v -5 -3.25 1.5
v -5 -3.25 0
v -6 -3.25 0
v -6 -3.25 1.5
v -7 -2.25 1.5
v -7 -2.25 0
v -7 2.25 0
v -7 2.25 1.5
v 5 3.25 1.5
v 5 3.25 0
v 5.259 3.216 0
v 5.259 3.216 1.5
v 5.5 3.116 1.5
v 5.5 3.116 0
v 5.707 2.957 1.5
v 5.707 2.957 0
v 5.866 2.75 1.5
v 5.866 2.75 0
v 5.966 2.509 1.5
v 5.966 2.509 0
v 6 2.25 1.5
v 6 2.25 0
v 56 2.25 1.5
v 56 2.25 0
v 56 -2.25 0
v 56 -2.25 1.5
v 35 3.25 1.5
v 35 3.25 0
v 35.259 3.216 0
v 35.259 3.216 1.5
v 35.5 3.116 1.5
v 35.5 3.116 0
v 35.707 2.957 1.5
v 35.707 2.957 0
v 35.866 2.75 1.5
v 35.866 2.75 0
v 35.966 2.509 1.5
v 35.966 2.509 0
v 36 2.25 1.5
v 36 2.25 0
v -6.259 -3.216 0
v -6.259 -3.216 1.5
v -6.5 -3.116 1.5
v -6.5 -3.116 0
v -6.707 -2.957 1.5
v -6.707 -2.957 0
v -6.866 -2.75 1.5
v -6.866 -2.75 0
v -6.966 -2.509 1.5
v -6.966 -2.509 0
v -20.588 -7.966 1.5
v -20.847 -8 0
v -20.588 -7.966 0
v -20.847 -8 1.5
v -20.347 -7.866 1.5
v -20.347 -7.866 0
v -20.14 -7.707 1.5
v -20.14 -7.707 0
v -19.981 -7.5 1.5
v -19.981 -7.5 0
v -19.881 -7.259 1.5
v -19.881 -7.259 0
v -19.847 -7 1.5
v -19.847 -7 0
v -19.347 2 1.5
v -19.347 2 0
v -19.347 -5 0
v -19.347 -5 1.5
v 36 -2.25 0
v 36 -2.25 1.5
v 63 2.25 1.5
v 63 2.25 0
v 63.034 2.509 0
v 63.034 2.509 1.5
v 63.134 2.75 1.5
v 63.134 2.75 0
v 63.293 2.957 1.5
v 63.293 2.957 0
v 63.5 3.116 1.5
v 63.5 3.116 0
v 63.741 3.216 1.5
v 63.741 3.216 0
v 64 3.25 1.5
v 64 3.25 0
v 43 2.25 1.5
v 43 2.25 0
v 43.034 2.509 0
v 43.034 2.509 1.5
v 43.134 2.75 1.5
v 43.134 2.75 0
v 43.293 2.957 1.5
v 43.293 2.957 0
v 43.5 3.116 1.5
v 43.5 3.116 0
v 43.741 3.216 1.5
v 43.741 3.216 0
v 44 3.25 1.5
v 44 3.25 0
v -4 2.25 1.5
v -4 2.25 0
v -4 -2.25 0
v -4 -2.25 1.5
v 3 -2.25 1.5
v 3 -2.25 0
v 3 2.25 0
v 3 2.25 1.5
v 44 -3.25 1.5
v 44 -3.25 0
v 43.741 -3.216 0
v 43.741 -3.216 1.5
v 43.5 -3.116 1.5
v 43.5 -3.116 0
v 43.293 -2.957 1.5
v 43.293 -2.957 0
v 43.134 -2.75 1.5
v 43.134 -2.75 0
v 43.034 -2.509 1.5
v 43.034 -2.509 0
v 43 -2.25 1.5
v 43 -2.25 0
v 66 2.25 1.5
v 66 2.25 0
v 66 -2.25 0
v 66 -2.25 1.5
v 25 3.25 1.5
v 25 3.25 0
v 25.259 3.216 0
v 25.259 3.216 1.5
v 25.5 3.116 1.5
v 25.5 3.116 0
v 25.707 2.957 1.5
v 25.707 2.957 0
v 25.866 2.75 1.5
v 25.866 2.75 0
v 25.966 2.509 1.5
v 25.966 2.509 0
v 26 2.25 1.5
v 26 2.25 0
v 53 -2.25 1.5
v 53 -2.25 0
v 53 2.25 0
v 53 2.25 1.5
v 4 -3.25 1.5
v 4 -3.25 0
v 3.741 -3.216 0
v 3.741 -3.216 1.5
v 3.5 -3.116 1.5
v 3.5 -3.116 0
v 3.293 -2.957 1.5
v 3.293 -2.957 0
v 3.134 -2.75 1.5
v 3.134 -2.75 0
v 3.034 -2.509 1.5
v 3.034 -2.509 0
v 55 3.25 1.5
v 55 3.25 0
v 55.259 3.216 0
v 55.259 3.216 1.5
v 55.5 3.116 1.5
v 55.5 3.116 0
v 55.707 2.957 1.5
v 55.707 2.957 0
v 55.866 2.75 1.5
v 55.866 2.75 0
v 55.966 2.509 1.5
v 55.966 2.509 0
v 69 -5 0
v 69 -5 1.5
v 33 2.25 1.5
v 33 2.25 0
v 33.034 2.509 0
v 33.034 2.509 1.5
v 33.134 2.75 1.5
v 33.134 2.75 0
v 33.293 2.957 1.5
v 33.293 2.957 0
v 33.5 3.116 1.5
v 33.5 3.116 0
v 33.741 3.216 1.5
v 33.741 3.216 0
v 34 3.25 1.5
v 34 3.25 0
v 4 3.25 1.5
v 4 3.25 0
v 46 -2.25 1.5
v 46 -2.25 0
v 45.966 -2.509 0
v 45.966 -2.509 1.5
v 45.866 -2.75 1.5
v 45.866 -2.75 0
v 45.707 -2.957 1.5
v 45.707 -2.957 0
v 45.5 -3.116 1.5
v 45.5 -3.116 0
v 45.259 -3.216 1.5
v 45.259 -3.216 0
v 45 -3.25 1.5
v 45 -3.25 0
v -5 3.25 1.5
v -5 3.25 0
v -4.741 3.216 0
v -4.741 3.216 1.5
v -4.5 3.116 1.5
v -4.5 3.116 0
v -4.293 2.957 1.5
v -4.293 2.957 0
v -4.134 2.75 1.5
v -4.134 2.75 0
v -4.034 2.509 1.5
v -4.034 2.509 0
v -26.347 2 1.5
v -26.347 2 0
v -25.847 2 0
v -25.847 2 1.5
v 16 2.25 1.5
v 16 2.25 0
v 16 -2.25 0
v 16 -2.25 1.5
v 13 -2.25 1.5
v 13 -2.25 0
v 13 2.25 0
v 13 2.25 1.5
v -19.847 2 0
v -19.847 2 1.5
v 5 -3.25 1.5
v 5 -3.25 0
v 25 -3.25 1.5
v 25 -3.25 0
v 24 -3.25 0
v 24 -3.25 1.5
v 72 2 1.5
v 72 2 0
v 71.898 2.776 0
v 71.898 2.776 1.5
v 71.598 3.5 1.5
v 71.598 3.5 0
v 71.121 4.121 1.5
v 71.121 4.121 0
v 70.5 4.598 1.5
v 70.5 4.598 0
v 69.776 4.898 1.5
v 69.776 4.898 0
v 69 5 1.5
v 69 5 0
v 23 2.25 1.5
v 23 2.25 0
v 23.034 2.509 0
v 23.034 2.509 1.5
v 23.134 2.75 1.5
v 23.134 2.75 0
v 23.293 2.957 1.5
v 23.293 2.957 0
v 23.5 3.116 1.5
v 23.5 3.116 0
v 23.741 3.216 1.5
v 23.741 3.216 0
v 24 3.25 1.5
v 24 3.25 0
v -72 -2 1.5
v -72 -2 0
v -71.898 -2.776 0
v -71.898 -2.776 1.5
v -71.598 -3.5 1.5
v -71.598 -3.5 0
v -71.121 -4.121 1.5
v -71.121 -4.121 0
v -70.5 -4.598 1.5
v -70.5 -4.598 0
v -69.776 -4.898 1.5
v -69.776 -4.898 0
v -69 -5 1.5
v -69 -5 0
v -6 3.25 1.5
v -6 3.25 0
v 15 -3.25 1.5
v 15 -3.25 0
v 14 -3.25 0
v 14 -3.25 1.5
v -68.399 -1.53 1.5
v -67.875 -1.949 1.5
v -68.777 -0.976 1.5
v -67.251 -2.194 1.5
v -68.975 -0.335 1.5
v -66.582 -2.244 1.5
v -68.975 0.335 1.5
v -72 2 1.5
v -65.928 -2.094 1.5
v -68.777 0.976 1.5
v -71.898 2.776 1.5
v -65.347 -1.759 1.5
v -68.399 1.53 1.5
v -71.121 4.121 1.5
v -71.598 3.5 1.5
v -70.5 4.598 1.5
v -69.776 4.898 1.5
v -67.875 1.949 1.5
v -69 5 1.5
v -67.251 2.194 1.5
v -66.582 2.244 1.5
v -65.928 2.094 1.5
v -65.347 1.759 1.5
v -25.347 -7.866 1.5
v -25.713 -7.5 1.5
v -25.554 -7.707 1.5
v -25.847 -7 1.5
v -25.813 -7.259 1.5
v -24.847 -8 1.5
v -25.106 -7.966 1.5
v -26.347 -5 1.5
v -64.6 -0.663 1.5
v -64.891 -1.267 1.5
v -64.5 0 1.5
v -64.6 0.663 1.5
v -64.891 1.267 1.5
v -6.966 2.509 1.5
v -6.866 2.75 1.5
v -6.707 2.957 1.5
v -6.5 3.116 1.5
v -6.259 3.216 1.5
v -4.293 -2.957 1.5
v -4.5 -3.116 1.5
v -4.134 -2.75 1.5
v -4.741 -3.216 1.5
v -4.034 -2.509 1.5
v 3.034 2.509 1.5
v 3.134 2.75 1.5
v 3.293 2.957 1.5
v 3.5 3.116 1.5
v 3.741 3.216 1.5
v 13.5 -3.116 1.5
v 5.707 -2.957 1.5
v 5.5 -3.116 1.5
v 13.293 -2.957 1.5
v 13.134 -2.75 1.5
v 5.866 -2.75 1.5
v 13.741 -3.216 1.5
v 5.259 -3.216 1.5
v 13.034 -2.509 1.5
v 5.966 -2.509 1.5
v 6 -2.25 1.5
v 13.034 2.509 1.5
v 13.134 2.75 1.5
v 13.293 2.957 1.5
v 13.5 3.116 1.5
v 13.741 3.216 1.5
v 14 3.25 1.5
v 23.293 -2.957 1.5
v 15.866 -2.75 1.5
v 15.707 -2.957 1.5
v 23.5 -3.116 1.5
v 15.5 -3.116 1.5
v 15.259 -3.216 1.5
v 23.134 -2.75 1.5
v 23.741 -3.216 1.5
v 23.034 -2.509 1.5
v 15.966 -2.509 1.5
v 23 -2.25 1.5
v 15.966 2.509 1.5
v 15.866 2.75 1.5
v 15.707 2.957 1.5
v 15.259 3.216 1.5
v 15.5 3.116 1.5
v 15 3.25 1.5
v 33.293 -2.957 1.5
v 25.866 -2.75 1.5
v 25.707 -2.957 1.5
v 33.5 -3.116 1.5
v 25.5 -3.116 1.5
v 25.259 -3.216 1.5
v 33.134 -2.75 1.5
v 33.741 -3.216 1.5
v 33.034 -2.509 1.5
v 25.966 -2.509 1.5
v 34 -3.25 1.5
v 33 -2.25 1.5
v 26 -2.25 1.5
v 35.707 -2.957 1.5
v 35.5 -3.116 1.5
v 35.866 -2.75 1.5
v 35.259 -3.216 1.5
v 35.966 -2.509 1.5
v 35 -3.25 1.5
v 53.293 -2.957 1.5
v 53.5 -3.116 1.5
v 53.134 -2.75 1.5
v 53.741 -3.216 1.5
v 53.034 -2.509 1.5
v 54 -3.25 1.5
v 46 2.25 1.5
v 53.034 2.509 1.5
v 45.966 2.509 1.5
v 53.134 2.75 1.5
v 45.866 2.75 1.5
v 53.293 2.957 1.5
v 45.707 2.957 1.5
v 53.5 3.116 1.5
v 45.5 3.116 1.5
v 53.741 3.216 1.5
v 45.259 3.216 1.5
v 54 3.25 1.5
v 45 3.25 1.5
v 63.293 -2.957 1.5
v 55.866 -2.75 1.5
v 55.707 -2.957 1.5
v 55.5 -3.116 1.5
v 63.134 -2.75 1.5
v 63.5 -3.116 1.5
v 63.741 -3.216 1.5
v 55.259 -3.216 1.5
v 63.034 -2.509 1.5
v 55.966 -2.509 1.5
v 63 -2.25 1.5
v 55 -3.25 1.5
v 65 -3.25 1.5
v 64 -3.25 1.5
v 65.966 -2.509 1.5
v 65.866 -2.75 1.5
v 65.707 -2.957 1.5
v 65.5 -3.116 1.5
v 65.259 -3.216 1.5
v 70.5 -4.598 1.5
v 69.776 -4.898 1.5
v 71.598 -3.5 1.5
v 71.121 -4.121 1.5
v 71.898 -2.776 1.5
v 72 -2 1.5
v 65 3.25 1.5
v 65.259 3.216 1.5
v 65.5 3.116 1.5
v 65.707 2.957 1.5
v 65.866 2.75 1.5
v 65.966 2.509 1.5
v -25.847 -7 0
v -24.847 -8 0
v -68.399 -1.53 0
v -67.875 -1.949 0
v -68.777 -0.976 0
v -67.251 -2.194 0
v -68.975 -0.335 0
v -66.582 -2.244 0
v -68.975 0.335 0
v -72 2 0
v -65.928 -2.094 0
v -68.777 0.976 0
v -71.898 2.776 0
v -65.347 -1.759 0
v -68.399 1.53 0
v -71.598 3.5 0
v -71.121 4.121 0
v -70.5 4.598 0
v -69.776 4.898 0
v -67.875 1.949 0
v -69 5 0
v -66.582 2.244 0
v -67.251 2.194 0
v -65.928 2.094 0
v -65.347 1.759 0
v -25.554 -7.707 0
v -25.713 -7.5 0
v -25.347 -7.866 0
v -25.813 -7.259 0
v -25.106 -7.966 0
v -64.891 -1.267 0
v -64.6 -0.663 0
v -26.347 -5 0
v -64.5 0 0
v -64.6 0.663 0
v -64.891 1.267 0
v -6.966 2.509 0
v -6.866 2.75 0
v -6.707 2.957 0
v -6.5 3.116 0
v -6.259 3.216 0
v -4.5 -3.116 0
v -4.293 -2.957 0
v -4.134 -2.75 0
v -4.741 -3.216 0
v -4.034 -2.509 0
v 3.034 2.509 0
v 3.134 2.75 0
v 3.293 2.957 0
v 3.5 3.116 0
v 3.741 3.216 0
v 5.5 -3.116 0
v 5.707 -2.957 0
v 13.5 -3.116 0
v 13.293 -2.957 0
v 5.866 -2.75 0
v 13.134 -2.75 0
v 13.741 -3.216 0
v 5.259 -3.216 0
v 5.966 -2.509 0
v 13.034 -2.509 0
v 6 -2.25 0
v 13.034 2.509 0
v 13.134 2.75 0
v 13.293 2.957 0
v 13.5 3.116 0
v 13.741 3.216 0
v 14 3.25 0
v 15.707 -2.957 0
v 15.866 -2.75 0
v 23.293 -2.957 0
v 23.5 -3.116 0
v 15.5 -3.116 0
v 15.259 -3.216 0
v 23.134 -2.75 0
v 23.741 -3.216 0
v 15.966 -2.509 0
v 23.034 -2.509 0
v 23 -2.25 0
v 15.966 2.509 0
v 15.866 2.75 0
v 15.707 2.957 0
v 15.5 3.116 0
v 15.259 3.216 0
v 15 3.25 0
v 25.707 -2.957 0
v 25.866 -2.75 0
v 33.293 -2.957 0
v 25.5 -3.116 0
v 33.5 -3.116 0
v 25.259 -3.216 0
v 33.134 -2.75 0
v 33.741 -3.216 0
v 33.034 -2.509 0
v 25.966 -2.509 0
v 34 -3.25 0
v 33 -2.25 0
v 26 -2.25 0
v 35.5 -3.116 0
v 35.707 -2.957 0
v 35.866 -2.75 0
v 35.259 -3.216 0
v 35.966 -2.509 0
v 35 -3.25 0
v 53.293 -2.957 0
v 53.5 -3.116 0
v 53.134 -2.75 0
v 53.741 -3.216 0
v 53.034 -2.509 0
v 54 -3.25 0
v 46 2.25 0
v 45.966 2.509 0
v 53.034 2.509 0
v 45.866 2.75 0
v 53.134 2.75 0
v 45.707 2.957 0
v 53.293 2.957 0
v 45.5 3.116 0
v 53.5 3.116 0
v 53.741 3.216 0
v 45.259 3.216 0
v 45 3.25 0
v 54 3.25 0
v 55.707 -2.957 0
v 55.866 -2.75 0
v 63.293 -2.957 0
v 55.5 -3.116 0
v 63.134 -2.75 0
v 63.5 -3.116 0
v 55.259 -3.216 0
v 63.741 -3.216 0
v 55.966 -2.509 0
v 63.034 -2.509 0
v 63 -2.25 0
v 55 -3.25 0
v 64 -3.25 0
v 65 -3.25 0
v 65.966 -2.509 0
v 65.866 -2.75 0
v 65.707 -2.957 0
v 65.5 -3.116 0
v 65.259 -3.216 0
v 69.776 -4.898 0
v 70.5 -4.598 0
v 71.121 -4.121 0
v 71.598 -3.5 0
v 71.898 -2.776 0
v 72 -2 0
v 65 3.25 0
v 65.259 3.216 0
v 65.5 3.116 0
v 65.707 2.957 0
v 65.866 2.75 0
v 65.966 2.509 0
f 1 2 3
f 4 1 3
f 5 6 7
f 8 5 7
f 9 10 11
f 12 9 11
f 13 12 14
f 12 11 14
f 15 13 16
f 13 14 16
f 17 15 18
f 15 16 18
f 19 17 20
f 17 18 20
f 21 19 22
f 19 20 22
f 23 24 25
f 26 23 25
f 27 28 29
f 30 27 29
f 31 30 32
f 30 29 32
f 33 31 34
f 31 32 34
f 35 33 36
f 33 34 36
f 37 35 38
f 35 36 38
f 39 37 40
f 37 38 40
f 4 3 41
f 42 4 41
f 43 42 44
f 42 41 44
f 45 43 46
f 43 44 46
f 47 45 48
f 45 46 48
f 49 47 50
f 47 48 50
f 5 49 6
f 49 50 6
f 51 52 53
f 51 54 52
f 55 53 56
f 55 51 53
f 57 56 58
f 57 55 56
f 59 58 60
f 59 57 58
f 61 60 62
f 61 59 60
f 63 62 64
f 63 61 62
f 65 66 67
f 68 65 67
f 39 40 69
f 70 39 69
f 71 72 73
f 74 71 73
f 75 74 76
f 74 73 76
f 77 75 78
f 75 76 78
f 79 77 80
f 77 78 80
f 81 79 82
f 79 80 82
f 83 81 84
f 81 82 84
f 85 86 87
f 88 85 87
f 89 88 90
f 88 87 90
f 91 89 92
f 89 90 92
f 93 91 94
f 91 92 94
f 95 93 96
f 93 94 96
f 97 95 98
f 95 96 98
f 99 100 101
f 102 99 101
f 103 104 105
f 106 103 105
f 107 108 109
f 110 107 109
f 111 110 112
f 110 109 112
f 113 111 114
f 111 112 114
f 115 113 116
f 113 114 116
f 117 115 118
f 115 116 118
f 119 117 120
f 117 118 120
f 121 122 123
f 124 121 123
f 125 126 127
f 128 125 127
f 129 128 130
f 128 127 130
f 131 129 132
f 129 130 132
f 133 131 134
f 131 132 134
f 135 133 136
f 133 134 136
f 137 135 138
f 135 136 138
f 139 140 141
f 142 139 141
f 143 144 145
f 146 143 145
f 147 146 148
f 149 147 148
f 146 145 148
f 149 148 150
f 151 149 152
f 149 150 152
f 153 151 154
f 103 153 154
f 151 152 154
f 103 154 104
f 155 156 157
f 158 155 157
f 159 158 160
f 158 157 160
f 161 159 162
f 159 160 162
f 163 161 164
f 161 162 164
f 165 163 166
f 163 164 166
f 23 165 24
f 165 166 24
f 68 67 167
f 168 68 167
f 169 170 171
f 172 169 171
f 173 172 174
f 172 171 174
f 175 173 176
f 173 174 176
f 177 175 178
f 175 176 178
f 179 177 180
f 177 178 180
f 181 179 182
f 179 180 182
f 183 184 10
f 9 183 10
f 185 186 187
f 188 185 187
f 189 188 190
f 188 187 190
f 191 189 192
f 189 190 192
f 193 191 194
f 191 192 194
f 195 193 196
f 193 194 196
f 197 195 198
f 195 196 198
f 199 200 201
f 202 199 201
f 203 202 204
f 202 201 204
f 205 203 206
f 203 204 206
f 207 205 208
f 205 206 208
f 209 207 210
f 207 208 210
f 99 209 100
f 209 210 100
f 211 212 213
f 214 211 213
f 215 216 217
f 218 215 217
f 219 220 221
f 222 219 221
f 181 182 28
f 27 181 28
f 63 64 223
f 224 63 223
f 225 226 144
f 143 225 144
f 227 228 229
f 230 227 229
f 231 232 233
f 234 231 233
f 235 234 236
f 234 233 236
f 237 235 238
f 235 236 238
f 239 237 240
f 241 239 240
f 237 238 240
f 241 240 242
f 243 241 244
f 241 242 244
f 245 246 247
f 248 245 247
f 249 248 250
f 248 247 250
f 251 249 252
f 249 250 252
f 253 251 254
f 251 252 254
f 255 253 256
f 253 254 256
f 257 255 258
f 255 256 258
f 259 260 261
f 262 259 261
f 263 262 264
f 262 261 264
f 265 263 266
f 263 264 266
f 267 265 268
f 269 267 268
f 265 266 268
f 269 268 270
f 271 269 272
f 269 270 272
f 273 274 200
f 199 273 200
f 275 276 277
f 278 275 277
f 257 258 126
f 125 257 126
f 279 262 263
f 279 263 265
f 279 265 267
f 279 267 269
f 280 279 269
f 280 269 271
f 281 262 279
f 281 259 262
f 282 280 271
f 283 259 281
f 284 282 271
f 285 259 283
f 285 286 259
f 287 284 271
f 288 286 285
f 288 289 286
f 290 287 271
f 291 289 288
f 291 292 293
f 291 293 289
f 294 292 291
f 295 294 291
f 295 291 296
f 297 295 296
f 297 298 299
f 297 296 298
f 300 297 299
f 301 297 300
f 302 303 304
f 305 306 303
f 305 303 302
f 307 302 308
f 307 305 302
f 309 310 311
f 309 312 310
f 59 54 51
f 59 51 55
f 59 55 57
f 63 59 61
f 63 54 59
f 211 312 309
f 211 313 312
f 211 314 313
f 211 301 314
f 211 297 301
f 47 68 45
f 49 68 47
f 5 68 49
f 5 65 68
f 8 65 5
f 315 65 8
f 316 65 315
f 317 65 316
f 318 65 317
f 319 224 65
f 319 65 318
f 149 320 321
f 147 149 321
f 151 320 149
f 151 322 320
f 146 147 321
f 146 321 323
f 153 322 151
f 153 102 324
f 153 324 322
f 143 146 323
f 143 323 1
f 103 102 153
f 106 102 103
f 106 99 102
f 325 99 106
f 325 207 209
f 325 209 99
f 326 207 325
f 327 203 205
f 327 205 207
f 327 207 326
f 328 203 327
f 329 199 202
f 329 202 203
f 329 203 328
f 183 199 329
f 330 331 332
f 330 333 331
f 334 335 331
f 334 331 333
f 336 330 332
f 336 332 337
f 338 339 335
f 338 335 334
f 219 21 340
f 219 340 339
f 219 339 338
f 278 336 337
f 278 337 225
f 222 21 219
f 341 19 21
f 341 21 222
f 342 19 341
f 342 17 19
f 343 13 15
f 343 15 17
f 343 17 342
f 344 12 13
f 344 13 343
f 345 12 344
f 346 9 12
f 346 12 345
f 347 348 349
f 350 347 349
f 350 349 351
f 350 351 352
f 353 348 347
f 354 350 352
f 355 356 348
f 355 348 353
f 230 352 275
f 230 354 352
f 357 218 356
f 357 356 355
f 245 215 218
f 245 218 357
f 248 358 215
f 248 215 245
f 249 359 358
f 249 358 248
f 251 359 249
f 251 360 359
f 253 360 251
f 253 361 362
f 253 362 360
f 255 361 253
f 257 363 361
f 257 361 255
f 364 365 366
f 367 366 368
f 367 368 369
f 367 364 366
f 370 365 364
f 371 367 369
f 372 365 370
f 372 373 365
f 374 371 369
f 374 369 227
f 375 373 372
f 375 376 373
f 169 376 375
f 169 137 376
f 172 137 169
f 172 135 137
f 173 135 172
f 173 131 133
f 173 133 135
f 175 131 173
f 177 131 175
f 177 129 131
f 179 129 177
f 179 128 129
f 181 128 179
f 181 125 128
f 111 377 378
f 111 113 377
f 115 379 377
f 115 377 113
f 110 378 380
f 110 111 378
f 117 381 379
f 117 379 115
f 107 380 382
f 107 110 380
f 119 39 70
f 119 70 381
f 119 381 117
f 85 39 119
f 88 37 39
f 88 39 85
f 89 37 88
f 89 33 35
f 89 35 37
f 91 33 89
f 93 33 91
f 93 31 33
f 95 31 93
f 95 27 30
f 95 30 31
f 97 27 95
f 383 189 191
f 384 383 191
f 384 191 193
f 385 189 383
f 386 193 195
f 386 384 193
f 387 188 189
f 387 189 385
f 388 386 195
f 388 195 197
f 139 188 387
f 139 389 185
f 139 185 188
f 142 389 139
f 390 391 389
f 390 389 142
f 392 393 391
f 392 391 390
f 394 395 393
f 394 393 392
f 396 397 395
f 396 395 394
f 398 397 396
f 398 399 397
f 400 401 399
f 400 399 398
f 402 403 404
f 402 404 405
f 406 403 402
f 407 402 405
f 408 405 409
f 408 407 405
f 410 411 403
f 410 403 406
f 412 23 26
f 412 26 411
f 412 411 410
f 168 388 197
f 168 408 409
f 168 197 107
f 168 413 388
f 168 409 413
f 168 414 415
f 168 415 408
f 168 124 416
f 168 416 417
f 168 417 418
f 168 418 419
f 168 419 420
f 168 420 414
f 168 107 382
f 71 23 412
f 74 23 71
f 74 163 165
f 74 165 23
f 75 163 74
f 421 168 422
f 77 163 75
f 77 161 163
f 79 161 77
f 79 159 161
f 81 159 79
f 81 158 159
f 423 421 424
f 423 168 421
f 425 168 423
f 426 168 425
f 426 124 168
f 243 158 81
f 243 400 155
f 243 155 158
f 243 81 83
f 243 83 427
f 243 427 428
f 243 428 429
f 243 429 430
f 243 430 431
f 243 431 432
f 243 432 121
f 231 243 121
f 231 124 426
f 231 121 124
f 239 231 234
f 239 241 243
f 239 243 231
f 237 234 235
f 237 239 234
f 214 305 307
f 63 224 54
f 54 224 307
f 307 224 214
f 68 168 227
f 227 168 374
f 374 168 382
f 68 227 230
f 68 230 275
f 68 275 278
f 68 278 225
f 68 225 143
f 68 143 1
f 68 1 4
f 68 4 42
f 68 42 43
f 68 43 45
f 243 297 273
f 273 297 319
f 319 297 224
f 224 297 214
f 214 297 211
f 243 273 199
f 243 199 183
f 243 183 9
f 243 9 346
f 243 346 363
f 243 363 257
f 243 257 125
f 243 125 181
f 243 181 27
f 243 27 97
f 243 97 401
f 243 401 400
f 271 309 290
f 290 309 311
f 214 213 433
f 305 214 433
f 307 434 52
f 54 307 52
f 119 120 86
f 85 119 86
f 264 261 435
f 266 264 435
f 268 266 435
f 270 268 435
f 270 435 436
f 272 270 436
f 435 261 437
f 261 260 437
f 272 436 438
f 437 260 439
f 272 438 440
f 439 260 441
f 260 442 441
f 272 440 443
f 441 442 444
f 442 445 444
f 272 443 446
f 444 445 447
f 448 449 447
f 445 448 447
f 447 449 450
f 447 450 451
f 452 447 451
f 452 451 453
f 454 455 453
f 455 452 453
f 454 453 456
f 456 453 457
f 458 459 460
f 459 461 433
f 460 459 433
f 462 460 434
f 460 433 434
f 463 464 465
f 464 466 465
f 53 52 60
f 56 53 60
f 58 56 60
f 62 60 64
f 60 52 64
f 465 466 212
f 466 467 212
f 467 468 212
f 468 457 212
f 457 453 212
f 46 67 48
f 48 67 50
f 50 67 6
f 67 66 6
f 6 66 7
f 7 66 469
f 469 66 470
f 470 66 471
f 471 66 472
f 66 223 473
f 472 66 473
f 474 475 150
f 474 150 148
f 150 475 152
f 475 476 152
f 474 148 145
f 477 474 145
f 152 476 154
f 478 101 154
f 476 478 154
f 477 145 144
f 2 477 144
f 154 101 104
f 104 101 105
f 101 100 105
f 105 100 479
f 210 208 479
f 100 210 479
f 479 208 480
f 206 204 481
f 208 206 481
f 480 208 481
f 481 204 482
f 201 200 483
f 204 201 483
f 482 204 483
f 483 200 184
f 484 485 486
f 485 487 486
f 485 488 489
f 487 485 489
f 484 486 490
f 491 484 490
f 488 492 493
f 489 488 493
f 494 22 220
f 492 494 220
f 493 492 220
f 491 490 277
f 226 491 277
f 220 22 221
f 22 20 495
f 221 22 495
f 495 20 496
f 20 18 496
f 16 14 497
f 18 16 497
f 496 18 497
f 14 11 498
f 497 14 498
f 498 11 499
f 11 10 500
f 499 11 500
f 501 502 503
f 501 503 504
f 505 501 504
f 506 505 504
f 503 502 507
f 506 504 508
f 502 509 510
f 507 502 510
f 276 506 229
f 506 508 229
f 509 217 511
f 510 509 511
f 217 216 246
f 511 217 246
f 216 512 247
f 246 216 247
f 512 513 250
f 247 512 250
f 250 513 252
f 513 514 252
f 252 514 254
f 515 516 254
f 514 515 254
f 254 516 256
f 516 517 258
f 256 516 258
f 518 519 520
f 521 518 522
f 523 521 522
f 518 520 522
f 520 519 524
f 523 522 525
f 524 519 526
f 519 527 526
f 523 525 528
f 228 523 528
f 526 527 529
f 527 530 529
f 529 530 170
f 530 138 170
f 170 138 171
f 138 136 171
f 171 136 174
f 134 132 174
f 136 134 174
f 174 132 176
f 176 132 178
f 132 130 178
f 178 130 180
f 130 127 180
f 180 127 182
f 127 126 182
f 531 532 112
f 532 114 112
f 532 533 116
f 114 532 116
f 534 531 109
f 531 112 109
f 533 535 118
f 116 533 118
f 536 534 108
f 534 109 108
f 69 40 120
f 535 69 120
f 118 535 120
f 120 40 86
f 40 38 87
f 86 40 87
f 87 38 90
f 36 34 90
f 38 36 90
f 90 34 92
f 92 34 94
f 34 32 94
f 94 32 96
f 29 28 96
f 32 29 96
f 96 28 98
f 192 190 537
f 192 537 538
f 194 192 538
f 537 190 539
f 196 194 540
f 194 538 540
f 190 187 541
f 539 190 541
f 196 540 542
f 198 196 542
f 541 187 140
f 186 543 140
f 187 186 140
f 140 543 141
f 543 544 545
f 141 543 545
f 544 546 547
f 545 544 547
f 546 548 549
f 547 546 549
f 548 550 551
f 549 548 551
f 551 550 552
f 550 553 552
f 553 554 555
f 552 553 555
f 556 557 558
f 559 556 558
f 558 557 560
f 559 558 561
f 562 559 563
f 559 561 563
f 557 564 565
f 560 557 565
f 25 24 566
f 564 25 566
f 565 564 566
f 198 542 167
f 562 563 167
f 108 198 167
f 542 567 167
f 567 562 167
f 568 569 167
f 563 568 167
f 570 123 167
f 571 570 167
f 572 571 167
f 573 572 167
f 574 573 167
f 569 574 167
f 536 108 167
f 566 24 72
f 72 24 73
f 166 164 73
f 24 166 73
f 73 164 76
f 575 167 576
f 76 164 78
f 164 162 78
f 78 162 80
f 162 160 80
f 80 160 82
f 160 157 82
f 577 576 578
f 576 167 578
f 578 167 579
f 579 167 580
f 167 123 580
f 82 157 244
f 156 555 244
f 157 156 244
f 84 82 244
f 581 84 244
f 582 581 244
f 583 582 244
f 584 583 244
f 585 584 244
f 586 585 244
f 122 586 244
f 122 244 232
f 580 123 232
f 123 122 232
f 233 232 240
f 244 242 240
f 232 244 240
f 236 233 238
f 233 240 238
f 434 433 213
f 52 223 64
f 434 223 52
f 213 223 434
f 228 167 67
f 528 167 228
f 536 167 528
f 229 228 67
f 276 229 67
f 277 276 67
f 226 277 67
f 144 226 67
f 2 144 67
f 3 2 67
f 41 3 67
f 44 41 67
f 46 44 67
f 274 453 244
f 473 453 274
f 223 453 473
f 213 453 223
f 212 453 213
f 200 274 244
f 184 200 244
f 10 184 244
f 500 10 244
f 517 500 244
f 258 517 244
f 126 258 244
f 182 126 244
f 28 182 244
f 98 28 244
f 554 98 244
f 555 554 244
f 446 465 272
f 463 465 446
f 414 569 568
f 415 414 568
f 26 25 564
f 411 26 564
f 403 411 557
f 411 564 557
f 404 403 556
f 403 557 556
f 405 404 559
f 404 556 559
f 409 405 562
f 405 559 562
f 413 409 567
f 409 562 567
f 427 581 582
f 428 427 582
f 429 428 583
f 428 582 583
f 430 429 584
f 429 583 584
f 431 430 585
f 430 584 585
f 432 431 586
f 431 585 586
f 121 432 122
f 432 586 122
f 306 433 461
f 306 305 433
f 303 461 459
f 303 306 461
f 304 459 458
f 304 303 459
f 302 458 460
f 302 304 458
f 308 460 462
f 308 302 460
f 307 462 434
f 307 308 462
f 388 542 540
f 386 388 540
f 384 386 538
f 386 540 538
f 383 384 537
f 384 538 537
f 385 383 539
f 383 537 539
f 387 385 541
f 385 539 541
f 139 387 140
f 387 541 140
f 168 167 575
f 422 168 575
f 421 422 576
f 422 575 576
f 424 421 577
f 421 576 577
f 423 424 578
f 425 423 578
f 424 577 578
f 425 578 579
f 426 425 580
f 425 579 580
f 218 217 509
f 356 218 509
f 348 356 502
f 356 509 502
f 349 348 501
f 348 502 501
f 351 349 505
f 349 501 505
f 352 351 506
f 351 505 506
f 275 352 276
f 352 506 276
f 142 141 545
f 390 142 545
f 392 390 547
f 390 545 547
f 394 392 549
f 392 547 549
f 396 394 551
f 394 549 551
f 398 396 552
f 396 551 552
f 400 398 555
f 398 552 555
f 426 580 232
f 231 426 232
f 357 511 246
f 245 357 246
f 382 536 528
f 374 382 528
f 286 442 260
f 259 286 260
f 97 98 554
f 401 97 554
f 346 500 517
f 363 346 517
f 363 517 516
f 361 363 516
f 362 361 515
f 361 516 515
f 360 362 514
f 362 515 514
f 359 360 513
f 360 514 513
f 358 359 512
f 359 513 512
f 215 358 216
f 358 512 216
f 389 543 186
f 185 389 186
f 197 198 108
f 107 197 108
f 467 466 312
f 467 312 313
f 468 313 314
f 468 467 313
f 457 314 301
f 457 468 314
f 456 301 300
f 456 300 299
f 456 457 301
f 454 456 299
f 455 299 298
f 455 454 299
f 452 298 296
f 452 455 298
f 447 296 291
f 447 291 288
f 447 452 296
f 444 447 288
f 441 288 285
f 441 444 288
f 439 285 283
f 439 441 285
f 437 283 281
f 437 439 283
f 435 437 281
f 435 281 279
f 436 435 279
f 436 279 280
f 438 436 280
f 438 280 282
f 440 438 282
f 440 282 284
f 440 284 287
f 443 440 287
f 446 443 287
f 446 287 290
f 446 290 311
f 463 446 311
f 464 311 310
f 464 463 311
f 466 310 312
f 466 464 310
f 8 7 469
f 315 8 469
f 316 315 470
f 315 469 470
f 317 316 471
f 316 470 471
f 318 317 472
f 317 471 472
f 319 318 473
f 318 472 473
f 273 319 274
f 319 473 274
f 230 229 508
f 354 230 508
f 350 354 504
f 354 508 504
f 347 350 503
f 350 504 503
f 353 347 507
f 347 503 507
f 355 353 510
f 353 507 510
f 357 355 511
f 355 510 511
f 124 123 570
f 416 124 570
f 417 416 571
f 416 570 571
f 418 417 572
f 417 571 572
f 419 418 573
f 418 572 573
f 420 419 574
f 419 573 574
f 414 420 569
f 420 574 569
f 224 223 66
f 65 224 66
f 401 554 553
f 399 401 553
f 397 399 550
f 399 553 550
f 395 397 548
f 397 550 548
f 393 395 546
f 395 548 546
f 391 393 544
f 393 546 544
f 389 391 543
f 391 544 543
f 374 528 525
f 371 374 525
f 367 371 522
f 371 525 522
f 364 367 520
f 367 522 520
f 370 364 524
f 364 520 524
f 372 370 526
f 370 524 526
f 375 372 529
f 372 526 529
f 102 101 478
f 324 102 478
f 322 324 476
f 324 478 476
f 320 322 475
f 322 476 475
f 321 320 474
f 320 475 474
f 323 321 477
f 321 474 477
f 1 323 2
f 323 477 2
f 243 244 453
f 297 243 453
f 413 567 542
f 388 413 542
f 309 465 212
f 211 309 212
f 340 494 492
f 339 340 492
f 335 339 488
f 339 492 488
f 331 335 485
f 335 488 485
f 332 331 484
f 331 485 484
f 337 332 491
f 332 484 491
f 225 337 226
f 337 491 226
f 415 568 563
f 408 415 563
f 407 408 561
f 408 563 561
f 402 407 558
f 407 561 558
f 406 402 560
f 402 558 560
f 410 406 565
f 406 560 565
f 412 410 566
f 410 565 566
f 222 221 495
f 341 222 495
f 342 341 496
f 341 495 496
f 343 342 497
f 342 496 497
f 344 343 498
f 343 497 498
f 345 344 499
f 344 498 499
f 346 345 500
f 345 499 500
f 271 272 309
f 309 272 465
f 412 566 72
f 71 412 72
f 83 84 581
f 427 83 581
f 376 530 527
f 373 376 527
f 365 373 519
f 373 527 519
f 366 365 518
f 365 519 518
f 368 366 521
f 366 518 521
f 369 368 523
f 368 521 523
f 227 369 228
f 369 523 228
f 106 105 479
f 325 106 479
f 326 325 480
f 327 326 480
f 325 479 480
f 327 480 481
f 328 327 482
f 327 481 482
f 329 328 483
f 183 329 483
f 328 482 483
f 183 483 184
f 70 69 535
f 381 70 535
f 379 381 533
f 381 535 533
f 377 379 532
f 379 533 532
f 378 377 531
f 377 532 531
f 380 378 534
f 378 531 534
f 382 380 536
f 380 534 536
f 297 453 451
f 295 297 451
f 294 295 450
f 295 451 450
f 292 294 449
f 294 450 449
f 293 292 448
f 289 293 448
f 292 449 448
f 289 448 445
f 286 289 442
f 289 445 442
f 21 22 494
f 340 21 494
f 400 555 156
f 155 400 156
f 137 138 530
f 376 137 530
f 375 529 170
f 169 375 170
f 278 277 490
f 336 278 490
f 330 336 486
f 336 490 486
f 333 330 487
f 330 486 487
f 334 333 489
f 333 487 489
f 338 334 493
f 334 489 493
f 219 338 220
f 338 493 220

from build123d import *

# Parameters (mm, degrees)
F0_R     = 2.25
F1_DEPTH = 1.5
F2_R     = 1


with BuildPart() as f1:
    # F0 (on Top) → F1 (new body)
    with BuildSketch(Plane.XY):
        with BuildLine():
            Line((-19.346866, -5), (69, -5))
            ThreePointArc((69, -5), (71.12132, -4.12132), (72, -2))
            Line((72, -2), (72, 2))
            ThreePointArc((72, 2), (71.12132, 4.12132), (69, 5))
            Line((69, 5), (-69, 5))
            ThreePointArc((-69, 5), (-71.12132, 4.12132), (-72, 2))
            Line((-72, 2), (-72, -2))
            ThreePointArc((-72, -2), (-71.12132, -4.12132), (-69, -5))
            Line((-69, -5), (-26.346866, -5))
            Line((-26.346866, -5), (-26.346866, 2))
            Line((-26.346866, 2), (-25.846866, 2))
            Line((-25.846866, 2), (-19.846866, 2))
            Line((-19.846866, 2), (-19.346866, 2))
            Line((-19.346866, 2), (-19.346866, -5))
        make_face()
        with Locations((-66.75, 0)):
            Circle(F0_R, mode=Mode.SUBTRACT)
        with BuildLine():
            ThreePointArc((-4, -2.25), (-4.292893, -2.957107), (-5, -3.25))
            Line((-5, -3.25), (-6, -3.25))
            ThreePointArc((-6, -3.25), (-6.707107, -2.957107), (-7, -2.25))
            Line((-7, -2.25), (-7, 2.25))
            ThreePointArc((-7, 2.25), (-6.707107, 2.957107), (-6, 3.25))
            Line((-6, 3.25), (-5, 3.25))
            ThreePointArc((-5, 3.25), (-4.292893, 2.957107), (-4, 2.25))
            Line((-4, 2.25), (-4, -2.25))
        make_face(mode=Mode.SUBTRACT)
        with BuildLine():
            ThreePointArc((4, -3.25), (3.292893, -2.957107), (3, -2.25))
            Line((3, -2.25), (3, 2.25))
            ThreePointArc((3, 2.25), (3.292893, 2.957107), (4, 3.25))
            Line((4, 3.25), (5, 3.25))
            ThreePointArc((5, 3.25), (5.707107, 2.957107), (6, 2.25))
            Line((6, 2.25), (6, -2.25))
            ThreePointArc((6, -2.25), (5.707107, -2.957107), (5, -3.25))
            Line((5, -3.25), (4, -3.25))
        make_face(mode=Mode.SUBTRACT)
        with BuildLine():
            ThreePointArc((14, -3.25), (13.292893, -2.957107), (13, -2.25))
            Line((13, -2.25), (13, 2.25))
            ThreePointArc((13, 2.25), (13.292893, 2.957107), (14, 3.25))
            Line((14, 3.25), (15, 3.25))
            ThreePointArc((15, 3.25), (15.707107, 2.957107), (16, 2.25))
            Line((16, 2.25), (16, -2.25))
            ThreePointArc((16, -2.25), (15.707107, -2.957107), (15, -3.25))
            Line((15, -3.25), (14, -3.25))
        make_face(mode=Mode.SUBTRACT)
        with BuildLine():
            ThreePointArc((24, -3.25), (23.292893, -2.957107), (23, -2.25))
            Line((23, -2.25), (23, 2.25))
            ThreePointArc((23, 2.25), (23.292893, 2.957107), (24, 3.25))
            Line((24, 3.25), (25, 3.25))
            ThreePointArc((25, 3.25), (25.707107, 2.957107), (26, 2.25))
            Line((26, 2.25), (26, -2.25))
            ThreePointArc((26, -2.25), (25.707107, -2.957107), (25, -3.25))
            Line((25, -3.25), (24, -3.25))
        make_face(mode=Mode.SUBTRACT)
        with BuildLine():
            ThreePointArc((34, -3.25), (33.292893, -2.957107), (33, -2.25))
            Line((33, -2.25), (33, 2.25))
            ThreePointArc((33, 2.25), (33.292893, 2.957107), (34, 3.25))
            Line((34, 3.25), (35, 3.25))
            ThreePointArc((35, 3.25), (35.707107, 2.957107), (36, 2.25))
            Line((36, 2.25), (36, -2.25))
            ThreePointArc((36, -2.25), (35.707107, -2.957107), (35, -3.25))
            Line((35, -3.25), (34, -3.25))
        make_face(mode=Mode.SUBTRACT)
        with BuildLine():
            ThreePointArc((44, -3.25), (43.292893, -2.957107), (43, -2.25))
            Line((43, -2.25), (43, 2.25))
            ThreePointArc((43, 2.25), (43.292893, 2.957107), (44, 3.25))
            Line((44, 3.25), (45, 3.25))
            ThreePointArc((45, 3.25), (45.707107, 2.957107), (46, 2.25))
            Line((46, 2.25), (46, -2.25))
            ThreePointArc((46, -2.25), (45.707107, -2.957107), (45, -3.25))
            Line((45, -3.25), (44, -3.25))
        make_face(mode=Mode.SUBTRACT)
        with BuildLine():
            ThreePointArc((54, -3.25), (53.292893, -2.957107), (53, -2.25))
            Line((53, -2.25), (53, 2.25))
            ThreePointArc((53, 2.25), (53.292893, 2.957107), (54, 3.25))
            Line((54, 3.25), (55, 3.25))
            ThreePointArc((55, 3.25), (55.707107, 2.957107), (56, 2.25))
            Line((56, 2.25), (56, -2.25))
            ThreePointArc((56, -2.25), (55.707107, -2.957107), (55, -3.25))
            Line((55, -3.25), (54, -3.25))
        make_face(mode=Mode.SUBTRACT)
        with BuildLine():
            ThreePointArc((64, -3.25), (63.292893, -2.957107), (63, -2.25))
            Line((63, -2.25), (63, 2.25))
            ThreePointArc((63, 2.25), (63.292893, 2.957107), (64, 3.25))
            Line((64, 3.25), (65, 3.25))
            ThreePointArc((65, 3.25), (65.707107, 2.957107), (66, 2.25))
            Line((66, 2.25), (66, -2.25))
            ThreePointArc((66, -2.25), (65.707107, -2.957107), (65, -3.25))
            Line((65, -3.25), (64, -3.25))
        make_face(mode=Mode.SUBTRACT)
        Polygon((-19.846866, -8), (-19.846866, -5), (-19.846866, 2), (-25.846866, 2), (-25.846866, -5), (-25.846866, -8), align=None)
    extrude(amount=F1_DEPTH)

    # F2
    f2_edges = [f1.edges().sort_by_distance(p)[0] for p in [
        (-25.846866, -8, 0.75),
        (-19.846866, -8, 0.75),
    ]]
    fillet(f2_edges, radius=F2_R)


solid = f1.part
